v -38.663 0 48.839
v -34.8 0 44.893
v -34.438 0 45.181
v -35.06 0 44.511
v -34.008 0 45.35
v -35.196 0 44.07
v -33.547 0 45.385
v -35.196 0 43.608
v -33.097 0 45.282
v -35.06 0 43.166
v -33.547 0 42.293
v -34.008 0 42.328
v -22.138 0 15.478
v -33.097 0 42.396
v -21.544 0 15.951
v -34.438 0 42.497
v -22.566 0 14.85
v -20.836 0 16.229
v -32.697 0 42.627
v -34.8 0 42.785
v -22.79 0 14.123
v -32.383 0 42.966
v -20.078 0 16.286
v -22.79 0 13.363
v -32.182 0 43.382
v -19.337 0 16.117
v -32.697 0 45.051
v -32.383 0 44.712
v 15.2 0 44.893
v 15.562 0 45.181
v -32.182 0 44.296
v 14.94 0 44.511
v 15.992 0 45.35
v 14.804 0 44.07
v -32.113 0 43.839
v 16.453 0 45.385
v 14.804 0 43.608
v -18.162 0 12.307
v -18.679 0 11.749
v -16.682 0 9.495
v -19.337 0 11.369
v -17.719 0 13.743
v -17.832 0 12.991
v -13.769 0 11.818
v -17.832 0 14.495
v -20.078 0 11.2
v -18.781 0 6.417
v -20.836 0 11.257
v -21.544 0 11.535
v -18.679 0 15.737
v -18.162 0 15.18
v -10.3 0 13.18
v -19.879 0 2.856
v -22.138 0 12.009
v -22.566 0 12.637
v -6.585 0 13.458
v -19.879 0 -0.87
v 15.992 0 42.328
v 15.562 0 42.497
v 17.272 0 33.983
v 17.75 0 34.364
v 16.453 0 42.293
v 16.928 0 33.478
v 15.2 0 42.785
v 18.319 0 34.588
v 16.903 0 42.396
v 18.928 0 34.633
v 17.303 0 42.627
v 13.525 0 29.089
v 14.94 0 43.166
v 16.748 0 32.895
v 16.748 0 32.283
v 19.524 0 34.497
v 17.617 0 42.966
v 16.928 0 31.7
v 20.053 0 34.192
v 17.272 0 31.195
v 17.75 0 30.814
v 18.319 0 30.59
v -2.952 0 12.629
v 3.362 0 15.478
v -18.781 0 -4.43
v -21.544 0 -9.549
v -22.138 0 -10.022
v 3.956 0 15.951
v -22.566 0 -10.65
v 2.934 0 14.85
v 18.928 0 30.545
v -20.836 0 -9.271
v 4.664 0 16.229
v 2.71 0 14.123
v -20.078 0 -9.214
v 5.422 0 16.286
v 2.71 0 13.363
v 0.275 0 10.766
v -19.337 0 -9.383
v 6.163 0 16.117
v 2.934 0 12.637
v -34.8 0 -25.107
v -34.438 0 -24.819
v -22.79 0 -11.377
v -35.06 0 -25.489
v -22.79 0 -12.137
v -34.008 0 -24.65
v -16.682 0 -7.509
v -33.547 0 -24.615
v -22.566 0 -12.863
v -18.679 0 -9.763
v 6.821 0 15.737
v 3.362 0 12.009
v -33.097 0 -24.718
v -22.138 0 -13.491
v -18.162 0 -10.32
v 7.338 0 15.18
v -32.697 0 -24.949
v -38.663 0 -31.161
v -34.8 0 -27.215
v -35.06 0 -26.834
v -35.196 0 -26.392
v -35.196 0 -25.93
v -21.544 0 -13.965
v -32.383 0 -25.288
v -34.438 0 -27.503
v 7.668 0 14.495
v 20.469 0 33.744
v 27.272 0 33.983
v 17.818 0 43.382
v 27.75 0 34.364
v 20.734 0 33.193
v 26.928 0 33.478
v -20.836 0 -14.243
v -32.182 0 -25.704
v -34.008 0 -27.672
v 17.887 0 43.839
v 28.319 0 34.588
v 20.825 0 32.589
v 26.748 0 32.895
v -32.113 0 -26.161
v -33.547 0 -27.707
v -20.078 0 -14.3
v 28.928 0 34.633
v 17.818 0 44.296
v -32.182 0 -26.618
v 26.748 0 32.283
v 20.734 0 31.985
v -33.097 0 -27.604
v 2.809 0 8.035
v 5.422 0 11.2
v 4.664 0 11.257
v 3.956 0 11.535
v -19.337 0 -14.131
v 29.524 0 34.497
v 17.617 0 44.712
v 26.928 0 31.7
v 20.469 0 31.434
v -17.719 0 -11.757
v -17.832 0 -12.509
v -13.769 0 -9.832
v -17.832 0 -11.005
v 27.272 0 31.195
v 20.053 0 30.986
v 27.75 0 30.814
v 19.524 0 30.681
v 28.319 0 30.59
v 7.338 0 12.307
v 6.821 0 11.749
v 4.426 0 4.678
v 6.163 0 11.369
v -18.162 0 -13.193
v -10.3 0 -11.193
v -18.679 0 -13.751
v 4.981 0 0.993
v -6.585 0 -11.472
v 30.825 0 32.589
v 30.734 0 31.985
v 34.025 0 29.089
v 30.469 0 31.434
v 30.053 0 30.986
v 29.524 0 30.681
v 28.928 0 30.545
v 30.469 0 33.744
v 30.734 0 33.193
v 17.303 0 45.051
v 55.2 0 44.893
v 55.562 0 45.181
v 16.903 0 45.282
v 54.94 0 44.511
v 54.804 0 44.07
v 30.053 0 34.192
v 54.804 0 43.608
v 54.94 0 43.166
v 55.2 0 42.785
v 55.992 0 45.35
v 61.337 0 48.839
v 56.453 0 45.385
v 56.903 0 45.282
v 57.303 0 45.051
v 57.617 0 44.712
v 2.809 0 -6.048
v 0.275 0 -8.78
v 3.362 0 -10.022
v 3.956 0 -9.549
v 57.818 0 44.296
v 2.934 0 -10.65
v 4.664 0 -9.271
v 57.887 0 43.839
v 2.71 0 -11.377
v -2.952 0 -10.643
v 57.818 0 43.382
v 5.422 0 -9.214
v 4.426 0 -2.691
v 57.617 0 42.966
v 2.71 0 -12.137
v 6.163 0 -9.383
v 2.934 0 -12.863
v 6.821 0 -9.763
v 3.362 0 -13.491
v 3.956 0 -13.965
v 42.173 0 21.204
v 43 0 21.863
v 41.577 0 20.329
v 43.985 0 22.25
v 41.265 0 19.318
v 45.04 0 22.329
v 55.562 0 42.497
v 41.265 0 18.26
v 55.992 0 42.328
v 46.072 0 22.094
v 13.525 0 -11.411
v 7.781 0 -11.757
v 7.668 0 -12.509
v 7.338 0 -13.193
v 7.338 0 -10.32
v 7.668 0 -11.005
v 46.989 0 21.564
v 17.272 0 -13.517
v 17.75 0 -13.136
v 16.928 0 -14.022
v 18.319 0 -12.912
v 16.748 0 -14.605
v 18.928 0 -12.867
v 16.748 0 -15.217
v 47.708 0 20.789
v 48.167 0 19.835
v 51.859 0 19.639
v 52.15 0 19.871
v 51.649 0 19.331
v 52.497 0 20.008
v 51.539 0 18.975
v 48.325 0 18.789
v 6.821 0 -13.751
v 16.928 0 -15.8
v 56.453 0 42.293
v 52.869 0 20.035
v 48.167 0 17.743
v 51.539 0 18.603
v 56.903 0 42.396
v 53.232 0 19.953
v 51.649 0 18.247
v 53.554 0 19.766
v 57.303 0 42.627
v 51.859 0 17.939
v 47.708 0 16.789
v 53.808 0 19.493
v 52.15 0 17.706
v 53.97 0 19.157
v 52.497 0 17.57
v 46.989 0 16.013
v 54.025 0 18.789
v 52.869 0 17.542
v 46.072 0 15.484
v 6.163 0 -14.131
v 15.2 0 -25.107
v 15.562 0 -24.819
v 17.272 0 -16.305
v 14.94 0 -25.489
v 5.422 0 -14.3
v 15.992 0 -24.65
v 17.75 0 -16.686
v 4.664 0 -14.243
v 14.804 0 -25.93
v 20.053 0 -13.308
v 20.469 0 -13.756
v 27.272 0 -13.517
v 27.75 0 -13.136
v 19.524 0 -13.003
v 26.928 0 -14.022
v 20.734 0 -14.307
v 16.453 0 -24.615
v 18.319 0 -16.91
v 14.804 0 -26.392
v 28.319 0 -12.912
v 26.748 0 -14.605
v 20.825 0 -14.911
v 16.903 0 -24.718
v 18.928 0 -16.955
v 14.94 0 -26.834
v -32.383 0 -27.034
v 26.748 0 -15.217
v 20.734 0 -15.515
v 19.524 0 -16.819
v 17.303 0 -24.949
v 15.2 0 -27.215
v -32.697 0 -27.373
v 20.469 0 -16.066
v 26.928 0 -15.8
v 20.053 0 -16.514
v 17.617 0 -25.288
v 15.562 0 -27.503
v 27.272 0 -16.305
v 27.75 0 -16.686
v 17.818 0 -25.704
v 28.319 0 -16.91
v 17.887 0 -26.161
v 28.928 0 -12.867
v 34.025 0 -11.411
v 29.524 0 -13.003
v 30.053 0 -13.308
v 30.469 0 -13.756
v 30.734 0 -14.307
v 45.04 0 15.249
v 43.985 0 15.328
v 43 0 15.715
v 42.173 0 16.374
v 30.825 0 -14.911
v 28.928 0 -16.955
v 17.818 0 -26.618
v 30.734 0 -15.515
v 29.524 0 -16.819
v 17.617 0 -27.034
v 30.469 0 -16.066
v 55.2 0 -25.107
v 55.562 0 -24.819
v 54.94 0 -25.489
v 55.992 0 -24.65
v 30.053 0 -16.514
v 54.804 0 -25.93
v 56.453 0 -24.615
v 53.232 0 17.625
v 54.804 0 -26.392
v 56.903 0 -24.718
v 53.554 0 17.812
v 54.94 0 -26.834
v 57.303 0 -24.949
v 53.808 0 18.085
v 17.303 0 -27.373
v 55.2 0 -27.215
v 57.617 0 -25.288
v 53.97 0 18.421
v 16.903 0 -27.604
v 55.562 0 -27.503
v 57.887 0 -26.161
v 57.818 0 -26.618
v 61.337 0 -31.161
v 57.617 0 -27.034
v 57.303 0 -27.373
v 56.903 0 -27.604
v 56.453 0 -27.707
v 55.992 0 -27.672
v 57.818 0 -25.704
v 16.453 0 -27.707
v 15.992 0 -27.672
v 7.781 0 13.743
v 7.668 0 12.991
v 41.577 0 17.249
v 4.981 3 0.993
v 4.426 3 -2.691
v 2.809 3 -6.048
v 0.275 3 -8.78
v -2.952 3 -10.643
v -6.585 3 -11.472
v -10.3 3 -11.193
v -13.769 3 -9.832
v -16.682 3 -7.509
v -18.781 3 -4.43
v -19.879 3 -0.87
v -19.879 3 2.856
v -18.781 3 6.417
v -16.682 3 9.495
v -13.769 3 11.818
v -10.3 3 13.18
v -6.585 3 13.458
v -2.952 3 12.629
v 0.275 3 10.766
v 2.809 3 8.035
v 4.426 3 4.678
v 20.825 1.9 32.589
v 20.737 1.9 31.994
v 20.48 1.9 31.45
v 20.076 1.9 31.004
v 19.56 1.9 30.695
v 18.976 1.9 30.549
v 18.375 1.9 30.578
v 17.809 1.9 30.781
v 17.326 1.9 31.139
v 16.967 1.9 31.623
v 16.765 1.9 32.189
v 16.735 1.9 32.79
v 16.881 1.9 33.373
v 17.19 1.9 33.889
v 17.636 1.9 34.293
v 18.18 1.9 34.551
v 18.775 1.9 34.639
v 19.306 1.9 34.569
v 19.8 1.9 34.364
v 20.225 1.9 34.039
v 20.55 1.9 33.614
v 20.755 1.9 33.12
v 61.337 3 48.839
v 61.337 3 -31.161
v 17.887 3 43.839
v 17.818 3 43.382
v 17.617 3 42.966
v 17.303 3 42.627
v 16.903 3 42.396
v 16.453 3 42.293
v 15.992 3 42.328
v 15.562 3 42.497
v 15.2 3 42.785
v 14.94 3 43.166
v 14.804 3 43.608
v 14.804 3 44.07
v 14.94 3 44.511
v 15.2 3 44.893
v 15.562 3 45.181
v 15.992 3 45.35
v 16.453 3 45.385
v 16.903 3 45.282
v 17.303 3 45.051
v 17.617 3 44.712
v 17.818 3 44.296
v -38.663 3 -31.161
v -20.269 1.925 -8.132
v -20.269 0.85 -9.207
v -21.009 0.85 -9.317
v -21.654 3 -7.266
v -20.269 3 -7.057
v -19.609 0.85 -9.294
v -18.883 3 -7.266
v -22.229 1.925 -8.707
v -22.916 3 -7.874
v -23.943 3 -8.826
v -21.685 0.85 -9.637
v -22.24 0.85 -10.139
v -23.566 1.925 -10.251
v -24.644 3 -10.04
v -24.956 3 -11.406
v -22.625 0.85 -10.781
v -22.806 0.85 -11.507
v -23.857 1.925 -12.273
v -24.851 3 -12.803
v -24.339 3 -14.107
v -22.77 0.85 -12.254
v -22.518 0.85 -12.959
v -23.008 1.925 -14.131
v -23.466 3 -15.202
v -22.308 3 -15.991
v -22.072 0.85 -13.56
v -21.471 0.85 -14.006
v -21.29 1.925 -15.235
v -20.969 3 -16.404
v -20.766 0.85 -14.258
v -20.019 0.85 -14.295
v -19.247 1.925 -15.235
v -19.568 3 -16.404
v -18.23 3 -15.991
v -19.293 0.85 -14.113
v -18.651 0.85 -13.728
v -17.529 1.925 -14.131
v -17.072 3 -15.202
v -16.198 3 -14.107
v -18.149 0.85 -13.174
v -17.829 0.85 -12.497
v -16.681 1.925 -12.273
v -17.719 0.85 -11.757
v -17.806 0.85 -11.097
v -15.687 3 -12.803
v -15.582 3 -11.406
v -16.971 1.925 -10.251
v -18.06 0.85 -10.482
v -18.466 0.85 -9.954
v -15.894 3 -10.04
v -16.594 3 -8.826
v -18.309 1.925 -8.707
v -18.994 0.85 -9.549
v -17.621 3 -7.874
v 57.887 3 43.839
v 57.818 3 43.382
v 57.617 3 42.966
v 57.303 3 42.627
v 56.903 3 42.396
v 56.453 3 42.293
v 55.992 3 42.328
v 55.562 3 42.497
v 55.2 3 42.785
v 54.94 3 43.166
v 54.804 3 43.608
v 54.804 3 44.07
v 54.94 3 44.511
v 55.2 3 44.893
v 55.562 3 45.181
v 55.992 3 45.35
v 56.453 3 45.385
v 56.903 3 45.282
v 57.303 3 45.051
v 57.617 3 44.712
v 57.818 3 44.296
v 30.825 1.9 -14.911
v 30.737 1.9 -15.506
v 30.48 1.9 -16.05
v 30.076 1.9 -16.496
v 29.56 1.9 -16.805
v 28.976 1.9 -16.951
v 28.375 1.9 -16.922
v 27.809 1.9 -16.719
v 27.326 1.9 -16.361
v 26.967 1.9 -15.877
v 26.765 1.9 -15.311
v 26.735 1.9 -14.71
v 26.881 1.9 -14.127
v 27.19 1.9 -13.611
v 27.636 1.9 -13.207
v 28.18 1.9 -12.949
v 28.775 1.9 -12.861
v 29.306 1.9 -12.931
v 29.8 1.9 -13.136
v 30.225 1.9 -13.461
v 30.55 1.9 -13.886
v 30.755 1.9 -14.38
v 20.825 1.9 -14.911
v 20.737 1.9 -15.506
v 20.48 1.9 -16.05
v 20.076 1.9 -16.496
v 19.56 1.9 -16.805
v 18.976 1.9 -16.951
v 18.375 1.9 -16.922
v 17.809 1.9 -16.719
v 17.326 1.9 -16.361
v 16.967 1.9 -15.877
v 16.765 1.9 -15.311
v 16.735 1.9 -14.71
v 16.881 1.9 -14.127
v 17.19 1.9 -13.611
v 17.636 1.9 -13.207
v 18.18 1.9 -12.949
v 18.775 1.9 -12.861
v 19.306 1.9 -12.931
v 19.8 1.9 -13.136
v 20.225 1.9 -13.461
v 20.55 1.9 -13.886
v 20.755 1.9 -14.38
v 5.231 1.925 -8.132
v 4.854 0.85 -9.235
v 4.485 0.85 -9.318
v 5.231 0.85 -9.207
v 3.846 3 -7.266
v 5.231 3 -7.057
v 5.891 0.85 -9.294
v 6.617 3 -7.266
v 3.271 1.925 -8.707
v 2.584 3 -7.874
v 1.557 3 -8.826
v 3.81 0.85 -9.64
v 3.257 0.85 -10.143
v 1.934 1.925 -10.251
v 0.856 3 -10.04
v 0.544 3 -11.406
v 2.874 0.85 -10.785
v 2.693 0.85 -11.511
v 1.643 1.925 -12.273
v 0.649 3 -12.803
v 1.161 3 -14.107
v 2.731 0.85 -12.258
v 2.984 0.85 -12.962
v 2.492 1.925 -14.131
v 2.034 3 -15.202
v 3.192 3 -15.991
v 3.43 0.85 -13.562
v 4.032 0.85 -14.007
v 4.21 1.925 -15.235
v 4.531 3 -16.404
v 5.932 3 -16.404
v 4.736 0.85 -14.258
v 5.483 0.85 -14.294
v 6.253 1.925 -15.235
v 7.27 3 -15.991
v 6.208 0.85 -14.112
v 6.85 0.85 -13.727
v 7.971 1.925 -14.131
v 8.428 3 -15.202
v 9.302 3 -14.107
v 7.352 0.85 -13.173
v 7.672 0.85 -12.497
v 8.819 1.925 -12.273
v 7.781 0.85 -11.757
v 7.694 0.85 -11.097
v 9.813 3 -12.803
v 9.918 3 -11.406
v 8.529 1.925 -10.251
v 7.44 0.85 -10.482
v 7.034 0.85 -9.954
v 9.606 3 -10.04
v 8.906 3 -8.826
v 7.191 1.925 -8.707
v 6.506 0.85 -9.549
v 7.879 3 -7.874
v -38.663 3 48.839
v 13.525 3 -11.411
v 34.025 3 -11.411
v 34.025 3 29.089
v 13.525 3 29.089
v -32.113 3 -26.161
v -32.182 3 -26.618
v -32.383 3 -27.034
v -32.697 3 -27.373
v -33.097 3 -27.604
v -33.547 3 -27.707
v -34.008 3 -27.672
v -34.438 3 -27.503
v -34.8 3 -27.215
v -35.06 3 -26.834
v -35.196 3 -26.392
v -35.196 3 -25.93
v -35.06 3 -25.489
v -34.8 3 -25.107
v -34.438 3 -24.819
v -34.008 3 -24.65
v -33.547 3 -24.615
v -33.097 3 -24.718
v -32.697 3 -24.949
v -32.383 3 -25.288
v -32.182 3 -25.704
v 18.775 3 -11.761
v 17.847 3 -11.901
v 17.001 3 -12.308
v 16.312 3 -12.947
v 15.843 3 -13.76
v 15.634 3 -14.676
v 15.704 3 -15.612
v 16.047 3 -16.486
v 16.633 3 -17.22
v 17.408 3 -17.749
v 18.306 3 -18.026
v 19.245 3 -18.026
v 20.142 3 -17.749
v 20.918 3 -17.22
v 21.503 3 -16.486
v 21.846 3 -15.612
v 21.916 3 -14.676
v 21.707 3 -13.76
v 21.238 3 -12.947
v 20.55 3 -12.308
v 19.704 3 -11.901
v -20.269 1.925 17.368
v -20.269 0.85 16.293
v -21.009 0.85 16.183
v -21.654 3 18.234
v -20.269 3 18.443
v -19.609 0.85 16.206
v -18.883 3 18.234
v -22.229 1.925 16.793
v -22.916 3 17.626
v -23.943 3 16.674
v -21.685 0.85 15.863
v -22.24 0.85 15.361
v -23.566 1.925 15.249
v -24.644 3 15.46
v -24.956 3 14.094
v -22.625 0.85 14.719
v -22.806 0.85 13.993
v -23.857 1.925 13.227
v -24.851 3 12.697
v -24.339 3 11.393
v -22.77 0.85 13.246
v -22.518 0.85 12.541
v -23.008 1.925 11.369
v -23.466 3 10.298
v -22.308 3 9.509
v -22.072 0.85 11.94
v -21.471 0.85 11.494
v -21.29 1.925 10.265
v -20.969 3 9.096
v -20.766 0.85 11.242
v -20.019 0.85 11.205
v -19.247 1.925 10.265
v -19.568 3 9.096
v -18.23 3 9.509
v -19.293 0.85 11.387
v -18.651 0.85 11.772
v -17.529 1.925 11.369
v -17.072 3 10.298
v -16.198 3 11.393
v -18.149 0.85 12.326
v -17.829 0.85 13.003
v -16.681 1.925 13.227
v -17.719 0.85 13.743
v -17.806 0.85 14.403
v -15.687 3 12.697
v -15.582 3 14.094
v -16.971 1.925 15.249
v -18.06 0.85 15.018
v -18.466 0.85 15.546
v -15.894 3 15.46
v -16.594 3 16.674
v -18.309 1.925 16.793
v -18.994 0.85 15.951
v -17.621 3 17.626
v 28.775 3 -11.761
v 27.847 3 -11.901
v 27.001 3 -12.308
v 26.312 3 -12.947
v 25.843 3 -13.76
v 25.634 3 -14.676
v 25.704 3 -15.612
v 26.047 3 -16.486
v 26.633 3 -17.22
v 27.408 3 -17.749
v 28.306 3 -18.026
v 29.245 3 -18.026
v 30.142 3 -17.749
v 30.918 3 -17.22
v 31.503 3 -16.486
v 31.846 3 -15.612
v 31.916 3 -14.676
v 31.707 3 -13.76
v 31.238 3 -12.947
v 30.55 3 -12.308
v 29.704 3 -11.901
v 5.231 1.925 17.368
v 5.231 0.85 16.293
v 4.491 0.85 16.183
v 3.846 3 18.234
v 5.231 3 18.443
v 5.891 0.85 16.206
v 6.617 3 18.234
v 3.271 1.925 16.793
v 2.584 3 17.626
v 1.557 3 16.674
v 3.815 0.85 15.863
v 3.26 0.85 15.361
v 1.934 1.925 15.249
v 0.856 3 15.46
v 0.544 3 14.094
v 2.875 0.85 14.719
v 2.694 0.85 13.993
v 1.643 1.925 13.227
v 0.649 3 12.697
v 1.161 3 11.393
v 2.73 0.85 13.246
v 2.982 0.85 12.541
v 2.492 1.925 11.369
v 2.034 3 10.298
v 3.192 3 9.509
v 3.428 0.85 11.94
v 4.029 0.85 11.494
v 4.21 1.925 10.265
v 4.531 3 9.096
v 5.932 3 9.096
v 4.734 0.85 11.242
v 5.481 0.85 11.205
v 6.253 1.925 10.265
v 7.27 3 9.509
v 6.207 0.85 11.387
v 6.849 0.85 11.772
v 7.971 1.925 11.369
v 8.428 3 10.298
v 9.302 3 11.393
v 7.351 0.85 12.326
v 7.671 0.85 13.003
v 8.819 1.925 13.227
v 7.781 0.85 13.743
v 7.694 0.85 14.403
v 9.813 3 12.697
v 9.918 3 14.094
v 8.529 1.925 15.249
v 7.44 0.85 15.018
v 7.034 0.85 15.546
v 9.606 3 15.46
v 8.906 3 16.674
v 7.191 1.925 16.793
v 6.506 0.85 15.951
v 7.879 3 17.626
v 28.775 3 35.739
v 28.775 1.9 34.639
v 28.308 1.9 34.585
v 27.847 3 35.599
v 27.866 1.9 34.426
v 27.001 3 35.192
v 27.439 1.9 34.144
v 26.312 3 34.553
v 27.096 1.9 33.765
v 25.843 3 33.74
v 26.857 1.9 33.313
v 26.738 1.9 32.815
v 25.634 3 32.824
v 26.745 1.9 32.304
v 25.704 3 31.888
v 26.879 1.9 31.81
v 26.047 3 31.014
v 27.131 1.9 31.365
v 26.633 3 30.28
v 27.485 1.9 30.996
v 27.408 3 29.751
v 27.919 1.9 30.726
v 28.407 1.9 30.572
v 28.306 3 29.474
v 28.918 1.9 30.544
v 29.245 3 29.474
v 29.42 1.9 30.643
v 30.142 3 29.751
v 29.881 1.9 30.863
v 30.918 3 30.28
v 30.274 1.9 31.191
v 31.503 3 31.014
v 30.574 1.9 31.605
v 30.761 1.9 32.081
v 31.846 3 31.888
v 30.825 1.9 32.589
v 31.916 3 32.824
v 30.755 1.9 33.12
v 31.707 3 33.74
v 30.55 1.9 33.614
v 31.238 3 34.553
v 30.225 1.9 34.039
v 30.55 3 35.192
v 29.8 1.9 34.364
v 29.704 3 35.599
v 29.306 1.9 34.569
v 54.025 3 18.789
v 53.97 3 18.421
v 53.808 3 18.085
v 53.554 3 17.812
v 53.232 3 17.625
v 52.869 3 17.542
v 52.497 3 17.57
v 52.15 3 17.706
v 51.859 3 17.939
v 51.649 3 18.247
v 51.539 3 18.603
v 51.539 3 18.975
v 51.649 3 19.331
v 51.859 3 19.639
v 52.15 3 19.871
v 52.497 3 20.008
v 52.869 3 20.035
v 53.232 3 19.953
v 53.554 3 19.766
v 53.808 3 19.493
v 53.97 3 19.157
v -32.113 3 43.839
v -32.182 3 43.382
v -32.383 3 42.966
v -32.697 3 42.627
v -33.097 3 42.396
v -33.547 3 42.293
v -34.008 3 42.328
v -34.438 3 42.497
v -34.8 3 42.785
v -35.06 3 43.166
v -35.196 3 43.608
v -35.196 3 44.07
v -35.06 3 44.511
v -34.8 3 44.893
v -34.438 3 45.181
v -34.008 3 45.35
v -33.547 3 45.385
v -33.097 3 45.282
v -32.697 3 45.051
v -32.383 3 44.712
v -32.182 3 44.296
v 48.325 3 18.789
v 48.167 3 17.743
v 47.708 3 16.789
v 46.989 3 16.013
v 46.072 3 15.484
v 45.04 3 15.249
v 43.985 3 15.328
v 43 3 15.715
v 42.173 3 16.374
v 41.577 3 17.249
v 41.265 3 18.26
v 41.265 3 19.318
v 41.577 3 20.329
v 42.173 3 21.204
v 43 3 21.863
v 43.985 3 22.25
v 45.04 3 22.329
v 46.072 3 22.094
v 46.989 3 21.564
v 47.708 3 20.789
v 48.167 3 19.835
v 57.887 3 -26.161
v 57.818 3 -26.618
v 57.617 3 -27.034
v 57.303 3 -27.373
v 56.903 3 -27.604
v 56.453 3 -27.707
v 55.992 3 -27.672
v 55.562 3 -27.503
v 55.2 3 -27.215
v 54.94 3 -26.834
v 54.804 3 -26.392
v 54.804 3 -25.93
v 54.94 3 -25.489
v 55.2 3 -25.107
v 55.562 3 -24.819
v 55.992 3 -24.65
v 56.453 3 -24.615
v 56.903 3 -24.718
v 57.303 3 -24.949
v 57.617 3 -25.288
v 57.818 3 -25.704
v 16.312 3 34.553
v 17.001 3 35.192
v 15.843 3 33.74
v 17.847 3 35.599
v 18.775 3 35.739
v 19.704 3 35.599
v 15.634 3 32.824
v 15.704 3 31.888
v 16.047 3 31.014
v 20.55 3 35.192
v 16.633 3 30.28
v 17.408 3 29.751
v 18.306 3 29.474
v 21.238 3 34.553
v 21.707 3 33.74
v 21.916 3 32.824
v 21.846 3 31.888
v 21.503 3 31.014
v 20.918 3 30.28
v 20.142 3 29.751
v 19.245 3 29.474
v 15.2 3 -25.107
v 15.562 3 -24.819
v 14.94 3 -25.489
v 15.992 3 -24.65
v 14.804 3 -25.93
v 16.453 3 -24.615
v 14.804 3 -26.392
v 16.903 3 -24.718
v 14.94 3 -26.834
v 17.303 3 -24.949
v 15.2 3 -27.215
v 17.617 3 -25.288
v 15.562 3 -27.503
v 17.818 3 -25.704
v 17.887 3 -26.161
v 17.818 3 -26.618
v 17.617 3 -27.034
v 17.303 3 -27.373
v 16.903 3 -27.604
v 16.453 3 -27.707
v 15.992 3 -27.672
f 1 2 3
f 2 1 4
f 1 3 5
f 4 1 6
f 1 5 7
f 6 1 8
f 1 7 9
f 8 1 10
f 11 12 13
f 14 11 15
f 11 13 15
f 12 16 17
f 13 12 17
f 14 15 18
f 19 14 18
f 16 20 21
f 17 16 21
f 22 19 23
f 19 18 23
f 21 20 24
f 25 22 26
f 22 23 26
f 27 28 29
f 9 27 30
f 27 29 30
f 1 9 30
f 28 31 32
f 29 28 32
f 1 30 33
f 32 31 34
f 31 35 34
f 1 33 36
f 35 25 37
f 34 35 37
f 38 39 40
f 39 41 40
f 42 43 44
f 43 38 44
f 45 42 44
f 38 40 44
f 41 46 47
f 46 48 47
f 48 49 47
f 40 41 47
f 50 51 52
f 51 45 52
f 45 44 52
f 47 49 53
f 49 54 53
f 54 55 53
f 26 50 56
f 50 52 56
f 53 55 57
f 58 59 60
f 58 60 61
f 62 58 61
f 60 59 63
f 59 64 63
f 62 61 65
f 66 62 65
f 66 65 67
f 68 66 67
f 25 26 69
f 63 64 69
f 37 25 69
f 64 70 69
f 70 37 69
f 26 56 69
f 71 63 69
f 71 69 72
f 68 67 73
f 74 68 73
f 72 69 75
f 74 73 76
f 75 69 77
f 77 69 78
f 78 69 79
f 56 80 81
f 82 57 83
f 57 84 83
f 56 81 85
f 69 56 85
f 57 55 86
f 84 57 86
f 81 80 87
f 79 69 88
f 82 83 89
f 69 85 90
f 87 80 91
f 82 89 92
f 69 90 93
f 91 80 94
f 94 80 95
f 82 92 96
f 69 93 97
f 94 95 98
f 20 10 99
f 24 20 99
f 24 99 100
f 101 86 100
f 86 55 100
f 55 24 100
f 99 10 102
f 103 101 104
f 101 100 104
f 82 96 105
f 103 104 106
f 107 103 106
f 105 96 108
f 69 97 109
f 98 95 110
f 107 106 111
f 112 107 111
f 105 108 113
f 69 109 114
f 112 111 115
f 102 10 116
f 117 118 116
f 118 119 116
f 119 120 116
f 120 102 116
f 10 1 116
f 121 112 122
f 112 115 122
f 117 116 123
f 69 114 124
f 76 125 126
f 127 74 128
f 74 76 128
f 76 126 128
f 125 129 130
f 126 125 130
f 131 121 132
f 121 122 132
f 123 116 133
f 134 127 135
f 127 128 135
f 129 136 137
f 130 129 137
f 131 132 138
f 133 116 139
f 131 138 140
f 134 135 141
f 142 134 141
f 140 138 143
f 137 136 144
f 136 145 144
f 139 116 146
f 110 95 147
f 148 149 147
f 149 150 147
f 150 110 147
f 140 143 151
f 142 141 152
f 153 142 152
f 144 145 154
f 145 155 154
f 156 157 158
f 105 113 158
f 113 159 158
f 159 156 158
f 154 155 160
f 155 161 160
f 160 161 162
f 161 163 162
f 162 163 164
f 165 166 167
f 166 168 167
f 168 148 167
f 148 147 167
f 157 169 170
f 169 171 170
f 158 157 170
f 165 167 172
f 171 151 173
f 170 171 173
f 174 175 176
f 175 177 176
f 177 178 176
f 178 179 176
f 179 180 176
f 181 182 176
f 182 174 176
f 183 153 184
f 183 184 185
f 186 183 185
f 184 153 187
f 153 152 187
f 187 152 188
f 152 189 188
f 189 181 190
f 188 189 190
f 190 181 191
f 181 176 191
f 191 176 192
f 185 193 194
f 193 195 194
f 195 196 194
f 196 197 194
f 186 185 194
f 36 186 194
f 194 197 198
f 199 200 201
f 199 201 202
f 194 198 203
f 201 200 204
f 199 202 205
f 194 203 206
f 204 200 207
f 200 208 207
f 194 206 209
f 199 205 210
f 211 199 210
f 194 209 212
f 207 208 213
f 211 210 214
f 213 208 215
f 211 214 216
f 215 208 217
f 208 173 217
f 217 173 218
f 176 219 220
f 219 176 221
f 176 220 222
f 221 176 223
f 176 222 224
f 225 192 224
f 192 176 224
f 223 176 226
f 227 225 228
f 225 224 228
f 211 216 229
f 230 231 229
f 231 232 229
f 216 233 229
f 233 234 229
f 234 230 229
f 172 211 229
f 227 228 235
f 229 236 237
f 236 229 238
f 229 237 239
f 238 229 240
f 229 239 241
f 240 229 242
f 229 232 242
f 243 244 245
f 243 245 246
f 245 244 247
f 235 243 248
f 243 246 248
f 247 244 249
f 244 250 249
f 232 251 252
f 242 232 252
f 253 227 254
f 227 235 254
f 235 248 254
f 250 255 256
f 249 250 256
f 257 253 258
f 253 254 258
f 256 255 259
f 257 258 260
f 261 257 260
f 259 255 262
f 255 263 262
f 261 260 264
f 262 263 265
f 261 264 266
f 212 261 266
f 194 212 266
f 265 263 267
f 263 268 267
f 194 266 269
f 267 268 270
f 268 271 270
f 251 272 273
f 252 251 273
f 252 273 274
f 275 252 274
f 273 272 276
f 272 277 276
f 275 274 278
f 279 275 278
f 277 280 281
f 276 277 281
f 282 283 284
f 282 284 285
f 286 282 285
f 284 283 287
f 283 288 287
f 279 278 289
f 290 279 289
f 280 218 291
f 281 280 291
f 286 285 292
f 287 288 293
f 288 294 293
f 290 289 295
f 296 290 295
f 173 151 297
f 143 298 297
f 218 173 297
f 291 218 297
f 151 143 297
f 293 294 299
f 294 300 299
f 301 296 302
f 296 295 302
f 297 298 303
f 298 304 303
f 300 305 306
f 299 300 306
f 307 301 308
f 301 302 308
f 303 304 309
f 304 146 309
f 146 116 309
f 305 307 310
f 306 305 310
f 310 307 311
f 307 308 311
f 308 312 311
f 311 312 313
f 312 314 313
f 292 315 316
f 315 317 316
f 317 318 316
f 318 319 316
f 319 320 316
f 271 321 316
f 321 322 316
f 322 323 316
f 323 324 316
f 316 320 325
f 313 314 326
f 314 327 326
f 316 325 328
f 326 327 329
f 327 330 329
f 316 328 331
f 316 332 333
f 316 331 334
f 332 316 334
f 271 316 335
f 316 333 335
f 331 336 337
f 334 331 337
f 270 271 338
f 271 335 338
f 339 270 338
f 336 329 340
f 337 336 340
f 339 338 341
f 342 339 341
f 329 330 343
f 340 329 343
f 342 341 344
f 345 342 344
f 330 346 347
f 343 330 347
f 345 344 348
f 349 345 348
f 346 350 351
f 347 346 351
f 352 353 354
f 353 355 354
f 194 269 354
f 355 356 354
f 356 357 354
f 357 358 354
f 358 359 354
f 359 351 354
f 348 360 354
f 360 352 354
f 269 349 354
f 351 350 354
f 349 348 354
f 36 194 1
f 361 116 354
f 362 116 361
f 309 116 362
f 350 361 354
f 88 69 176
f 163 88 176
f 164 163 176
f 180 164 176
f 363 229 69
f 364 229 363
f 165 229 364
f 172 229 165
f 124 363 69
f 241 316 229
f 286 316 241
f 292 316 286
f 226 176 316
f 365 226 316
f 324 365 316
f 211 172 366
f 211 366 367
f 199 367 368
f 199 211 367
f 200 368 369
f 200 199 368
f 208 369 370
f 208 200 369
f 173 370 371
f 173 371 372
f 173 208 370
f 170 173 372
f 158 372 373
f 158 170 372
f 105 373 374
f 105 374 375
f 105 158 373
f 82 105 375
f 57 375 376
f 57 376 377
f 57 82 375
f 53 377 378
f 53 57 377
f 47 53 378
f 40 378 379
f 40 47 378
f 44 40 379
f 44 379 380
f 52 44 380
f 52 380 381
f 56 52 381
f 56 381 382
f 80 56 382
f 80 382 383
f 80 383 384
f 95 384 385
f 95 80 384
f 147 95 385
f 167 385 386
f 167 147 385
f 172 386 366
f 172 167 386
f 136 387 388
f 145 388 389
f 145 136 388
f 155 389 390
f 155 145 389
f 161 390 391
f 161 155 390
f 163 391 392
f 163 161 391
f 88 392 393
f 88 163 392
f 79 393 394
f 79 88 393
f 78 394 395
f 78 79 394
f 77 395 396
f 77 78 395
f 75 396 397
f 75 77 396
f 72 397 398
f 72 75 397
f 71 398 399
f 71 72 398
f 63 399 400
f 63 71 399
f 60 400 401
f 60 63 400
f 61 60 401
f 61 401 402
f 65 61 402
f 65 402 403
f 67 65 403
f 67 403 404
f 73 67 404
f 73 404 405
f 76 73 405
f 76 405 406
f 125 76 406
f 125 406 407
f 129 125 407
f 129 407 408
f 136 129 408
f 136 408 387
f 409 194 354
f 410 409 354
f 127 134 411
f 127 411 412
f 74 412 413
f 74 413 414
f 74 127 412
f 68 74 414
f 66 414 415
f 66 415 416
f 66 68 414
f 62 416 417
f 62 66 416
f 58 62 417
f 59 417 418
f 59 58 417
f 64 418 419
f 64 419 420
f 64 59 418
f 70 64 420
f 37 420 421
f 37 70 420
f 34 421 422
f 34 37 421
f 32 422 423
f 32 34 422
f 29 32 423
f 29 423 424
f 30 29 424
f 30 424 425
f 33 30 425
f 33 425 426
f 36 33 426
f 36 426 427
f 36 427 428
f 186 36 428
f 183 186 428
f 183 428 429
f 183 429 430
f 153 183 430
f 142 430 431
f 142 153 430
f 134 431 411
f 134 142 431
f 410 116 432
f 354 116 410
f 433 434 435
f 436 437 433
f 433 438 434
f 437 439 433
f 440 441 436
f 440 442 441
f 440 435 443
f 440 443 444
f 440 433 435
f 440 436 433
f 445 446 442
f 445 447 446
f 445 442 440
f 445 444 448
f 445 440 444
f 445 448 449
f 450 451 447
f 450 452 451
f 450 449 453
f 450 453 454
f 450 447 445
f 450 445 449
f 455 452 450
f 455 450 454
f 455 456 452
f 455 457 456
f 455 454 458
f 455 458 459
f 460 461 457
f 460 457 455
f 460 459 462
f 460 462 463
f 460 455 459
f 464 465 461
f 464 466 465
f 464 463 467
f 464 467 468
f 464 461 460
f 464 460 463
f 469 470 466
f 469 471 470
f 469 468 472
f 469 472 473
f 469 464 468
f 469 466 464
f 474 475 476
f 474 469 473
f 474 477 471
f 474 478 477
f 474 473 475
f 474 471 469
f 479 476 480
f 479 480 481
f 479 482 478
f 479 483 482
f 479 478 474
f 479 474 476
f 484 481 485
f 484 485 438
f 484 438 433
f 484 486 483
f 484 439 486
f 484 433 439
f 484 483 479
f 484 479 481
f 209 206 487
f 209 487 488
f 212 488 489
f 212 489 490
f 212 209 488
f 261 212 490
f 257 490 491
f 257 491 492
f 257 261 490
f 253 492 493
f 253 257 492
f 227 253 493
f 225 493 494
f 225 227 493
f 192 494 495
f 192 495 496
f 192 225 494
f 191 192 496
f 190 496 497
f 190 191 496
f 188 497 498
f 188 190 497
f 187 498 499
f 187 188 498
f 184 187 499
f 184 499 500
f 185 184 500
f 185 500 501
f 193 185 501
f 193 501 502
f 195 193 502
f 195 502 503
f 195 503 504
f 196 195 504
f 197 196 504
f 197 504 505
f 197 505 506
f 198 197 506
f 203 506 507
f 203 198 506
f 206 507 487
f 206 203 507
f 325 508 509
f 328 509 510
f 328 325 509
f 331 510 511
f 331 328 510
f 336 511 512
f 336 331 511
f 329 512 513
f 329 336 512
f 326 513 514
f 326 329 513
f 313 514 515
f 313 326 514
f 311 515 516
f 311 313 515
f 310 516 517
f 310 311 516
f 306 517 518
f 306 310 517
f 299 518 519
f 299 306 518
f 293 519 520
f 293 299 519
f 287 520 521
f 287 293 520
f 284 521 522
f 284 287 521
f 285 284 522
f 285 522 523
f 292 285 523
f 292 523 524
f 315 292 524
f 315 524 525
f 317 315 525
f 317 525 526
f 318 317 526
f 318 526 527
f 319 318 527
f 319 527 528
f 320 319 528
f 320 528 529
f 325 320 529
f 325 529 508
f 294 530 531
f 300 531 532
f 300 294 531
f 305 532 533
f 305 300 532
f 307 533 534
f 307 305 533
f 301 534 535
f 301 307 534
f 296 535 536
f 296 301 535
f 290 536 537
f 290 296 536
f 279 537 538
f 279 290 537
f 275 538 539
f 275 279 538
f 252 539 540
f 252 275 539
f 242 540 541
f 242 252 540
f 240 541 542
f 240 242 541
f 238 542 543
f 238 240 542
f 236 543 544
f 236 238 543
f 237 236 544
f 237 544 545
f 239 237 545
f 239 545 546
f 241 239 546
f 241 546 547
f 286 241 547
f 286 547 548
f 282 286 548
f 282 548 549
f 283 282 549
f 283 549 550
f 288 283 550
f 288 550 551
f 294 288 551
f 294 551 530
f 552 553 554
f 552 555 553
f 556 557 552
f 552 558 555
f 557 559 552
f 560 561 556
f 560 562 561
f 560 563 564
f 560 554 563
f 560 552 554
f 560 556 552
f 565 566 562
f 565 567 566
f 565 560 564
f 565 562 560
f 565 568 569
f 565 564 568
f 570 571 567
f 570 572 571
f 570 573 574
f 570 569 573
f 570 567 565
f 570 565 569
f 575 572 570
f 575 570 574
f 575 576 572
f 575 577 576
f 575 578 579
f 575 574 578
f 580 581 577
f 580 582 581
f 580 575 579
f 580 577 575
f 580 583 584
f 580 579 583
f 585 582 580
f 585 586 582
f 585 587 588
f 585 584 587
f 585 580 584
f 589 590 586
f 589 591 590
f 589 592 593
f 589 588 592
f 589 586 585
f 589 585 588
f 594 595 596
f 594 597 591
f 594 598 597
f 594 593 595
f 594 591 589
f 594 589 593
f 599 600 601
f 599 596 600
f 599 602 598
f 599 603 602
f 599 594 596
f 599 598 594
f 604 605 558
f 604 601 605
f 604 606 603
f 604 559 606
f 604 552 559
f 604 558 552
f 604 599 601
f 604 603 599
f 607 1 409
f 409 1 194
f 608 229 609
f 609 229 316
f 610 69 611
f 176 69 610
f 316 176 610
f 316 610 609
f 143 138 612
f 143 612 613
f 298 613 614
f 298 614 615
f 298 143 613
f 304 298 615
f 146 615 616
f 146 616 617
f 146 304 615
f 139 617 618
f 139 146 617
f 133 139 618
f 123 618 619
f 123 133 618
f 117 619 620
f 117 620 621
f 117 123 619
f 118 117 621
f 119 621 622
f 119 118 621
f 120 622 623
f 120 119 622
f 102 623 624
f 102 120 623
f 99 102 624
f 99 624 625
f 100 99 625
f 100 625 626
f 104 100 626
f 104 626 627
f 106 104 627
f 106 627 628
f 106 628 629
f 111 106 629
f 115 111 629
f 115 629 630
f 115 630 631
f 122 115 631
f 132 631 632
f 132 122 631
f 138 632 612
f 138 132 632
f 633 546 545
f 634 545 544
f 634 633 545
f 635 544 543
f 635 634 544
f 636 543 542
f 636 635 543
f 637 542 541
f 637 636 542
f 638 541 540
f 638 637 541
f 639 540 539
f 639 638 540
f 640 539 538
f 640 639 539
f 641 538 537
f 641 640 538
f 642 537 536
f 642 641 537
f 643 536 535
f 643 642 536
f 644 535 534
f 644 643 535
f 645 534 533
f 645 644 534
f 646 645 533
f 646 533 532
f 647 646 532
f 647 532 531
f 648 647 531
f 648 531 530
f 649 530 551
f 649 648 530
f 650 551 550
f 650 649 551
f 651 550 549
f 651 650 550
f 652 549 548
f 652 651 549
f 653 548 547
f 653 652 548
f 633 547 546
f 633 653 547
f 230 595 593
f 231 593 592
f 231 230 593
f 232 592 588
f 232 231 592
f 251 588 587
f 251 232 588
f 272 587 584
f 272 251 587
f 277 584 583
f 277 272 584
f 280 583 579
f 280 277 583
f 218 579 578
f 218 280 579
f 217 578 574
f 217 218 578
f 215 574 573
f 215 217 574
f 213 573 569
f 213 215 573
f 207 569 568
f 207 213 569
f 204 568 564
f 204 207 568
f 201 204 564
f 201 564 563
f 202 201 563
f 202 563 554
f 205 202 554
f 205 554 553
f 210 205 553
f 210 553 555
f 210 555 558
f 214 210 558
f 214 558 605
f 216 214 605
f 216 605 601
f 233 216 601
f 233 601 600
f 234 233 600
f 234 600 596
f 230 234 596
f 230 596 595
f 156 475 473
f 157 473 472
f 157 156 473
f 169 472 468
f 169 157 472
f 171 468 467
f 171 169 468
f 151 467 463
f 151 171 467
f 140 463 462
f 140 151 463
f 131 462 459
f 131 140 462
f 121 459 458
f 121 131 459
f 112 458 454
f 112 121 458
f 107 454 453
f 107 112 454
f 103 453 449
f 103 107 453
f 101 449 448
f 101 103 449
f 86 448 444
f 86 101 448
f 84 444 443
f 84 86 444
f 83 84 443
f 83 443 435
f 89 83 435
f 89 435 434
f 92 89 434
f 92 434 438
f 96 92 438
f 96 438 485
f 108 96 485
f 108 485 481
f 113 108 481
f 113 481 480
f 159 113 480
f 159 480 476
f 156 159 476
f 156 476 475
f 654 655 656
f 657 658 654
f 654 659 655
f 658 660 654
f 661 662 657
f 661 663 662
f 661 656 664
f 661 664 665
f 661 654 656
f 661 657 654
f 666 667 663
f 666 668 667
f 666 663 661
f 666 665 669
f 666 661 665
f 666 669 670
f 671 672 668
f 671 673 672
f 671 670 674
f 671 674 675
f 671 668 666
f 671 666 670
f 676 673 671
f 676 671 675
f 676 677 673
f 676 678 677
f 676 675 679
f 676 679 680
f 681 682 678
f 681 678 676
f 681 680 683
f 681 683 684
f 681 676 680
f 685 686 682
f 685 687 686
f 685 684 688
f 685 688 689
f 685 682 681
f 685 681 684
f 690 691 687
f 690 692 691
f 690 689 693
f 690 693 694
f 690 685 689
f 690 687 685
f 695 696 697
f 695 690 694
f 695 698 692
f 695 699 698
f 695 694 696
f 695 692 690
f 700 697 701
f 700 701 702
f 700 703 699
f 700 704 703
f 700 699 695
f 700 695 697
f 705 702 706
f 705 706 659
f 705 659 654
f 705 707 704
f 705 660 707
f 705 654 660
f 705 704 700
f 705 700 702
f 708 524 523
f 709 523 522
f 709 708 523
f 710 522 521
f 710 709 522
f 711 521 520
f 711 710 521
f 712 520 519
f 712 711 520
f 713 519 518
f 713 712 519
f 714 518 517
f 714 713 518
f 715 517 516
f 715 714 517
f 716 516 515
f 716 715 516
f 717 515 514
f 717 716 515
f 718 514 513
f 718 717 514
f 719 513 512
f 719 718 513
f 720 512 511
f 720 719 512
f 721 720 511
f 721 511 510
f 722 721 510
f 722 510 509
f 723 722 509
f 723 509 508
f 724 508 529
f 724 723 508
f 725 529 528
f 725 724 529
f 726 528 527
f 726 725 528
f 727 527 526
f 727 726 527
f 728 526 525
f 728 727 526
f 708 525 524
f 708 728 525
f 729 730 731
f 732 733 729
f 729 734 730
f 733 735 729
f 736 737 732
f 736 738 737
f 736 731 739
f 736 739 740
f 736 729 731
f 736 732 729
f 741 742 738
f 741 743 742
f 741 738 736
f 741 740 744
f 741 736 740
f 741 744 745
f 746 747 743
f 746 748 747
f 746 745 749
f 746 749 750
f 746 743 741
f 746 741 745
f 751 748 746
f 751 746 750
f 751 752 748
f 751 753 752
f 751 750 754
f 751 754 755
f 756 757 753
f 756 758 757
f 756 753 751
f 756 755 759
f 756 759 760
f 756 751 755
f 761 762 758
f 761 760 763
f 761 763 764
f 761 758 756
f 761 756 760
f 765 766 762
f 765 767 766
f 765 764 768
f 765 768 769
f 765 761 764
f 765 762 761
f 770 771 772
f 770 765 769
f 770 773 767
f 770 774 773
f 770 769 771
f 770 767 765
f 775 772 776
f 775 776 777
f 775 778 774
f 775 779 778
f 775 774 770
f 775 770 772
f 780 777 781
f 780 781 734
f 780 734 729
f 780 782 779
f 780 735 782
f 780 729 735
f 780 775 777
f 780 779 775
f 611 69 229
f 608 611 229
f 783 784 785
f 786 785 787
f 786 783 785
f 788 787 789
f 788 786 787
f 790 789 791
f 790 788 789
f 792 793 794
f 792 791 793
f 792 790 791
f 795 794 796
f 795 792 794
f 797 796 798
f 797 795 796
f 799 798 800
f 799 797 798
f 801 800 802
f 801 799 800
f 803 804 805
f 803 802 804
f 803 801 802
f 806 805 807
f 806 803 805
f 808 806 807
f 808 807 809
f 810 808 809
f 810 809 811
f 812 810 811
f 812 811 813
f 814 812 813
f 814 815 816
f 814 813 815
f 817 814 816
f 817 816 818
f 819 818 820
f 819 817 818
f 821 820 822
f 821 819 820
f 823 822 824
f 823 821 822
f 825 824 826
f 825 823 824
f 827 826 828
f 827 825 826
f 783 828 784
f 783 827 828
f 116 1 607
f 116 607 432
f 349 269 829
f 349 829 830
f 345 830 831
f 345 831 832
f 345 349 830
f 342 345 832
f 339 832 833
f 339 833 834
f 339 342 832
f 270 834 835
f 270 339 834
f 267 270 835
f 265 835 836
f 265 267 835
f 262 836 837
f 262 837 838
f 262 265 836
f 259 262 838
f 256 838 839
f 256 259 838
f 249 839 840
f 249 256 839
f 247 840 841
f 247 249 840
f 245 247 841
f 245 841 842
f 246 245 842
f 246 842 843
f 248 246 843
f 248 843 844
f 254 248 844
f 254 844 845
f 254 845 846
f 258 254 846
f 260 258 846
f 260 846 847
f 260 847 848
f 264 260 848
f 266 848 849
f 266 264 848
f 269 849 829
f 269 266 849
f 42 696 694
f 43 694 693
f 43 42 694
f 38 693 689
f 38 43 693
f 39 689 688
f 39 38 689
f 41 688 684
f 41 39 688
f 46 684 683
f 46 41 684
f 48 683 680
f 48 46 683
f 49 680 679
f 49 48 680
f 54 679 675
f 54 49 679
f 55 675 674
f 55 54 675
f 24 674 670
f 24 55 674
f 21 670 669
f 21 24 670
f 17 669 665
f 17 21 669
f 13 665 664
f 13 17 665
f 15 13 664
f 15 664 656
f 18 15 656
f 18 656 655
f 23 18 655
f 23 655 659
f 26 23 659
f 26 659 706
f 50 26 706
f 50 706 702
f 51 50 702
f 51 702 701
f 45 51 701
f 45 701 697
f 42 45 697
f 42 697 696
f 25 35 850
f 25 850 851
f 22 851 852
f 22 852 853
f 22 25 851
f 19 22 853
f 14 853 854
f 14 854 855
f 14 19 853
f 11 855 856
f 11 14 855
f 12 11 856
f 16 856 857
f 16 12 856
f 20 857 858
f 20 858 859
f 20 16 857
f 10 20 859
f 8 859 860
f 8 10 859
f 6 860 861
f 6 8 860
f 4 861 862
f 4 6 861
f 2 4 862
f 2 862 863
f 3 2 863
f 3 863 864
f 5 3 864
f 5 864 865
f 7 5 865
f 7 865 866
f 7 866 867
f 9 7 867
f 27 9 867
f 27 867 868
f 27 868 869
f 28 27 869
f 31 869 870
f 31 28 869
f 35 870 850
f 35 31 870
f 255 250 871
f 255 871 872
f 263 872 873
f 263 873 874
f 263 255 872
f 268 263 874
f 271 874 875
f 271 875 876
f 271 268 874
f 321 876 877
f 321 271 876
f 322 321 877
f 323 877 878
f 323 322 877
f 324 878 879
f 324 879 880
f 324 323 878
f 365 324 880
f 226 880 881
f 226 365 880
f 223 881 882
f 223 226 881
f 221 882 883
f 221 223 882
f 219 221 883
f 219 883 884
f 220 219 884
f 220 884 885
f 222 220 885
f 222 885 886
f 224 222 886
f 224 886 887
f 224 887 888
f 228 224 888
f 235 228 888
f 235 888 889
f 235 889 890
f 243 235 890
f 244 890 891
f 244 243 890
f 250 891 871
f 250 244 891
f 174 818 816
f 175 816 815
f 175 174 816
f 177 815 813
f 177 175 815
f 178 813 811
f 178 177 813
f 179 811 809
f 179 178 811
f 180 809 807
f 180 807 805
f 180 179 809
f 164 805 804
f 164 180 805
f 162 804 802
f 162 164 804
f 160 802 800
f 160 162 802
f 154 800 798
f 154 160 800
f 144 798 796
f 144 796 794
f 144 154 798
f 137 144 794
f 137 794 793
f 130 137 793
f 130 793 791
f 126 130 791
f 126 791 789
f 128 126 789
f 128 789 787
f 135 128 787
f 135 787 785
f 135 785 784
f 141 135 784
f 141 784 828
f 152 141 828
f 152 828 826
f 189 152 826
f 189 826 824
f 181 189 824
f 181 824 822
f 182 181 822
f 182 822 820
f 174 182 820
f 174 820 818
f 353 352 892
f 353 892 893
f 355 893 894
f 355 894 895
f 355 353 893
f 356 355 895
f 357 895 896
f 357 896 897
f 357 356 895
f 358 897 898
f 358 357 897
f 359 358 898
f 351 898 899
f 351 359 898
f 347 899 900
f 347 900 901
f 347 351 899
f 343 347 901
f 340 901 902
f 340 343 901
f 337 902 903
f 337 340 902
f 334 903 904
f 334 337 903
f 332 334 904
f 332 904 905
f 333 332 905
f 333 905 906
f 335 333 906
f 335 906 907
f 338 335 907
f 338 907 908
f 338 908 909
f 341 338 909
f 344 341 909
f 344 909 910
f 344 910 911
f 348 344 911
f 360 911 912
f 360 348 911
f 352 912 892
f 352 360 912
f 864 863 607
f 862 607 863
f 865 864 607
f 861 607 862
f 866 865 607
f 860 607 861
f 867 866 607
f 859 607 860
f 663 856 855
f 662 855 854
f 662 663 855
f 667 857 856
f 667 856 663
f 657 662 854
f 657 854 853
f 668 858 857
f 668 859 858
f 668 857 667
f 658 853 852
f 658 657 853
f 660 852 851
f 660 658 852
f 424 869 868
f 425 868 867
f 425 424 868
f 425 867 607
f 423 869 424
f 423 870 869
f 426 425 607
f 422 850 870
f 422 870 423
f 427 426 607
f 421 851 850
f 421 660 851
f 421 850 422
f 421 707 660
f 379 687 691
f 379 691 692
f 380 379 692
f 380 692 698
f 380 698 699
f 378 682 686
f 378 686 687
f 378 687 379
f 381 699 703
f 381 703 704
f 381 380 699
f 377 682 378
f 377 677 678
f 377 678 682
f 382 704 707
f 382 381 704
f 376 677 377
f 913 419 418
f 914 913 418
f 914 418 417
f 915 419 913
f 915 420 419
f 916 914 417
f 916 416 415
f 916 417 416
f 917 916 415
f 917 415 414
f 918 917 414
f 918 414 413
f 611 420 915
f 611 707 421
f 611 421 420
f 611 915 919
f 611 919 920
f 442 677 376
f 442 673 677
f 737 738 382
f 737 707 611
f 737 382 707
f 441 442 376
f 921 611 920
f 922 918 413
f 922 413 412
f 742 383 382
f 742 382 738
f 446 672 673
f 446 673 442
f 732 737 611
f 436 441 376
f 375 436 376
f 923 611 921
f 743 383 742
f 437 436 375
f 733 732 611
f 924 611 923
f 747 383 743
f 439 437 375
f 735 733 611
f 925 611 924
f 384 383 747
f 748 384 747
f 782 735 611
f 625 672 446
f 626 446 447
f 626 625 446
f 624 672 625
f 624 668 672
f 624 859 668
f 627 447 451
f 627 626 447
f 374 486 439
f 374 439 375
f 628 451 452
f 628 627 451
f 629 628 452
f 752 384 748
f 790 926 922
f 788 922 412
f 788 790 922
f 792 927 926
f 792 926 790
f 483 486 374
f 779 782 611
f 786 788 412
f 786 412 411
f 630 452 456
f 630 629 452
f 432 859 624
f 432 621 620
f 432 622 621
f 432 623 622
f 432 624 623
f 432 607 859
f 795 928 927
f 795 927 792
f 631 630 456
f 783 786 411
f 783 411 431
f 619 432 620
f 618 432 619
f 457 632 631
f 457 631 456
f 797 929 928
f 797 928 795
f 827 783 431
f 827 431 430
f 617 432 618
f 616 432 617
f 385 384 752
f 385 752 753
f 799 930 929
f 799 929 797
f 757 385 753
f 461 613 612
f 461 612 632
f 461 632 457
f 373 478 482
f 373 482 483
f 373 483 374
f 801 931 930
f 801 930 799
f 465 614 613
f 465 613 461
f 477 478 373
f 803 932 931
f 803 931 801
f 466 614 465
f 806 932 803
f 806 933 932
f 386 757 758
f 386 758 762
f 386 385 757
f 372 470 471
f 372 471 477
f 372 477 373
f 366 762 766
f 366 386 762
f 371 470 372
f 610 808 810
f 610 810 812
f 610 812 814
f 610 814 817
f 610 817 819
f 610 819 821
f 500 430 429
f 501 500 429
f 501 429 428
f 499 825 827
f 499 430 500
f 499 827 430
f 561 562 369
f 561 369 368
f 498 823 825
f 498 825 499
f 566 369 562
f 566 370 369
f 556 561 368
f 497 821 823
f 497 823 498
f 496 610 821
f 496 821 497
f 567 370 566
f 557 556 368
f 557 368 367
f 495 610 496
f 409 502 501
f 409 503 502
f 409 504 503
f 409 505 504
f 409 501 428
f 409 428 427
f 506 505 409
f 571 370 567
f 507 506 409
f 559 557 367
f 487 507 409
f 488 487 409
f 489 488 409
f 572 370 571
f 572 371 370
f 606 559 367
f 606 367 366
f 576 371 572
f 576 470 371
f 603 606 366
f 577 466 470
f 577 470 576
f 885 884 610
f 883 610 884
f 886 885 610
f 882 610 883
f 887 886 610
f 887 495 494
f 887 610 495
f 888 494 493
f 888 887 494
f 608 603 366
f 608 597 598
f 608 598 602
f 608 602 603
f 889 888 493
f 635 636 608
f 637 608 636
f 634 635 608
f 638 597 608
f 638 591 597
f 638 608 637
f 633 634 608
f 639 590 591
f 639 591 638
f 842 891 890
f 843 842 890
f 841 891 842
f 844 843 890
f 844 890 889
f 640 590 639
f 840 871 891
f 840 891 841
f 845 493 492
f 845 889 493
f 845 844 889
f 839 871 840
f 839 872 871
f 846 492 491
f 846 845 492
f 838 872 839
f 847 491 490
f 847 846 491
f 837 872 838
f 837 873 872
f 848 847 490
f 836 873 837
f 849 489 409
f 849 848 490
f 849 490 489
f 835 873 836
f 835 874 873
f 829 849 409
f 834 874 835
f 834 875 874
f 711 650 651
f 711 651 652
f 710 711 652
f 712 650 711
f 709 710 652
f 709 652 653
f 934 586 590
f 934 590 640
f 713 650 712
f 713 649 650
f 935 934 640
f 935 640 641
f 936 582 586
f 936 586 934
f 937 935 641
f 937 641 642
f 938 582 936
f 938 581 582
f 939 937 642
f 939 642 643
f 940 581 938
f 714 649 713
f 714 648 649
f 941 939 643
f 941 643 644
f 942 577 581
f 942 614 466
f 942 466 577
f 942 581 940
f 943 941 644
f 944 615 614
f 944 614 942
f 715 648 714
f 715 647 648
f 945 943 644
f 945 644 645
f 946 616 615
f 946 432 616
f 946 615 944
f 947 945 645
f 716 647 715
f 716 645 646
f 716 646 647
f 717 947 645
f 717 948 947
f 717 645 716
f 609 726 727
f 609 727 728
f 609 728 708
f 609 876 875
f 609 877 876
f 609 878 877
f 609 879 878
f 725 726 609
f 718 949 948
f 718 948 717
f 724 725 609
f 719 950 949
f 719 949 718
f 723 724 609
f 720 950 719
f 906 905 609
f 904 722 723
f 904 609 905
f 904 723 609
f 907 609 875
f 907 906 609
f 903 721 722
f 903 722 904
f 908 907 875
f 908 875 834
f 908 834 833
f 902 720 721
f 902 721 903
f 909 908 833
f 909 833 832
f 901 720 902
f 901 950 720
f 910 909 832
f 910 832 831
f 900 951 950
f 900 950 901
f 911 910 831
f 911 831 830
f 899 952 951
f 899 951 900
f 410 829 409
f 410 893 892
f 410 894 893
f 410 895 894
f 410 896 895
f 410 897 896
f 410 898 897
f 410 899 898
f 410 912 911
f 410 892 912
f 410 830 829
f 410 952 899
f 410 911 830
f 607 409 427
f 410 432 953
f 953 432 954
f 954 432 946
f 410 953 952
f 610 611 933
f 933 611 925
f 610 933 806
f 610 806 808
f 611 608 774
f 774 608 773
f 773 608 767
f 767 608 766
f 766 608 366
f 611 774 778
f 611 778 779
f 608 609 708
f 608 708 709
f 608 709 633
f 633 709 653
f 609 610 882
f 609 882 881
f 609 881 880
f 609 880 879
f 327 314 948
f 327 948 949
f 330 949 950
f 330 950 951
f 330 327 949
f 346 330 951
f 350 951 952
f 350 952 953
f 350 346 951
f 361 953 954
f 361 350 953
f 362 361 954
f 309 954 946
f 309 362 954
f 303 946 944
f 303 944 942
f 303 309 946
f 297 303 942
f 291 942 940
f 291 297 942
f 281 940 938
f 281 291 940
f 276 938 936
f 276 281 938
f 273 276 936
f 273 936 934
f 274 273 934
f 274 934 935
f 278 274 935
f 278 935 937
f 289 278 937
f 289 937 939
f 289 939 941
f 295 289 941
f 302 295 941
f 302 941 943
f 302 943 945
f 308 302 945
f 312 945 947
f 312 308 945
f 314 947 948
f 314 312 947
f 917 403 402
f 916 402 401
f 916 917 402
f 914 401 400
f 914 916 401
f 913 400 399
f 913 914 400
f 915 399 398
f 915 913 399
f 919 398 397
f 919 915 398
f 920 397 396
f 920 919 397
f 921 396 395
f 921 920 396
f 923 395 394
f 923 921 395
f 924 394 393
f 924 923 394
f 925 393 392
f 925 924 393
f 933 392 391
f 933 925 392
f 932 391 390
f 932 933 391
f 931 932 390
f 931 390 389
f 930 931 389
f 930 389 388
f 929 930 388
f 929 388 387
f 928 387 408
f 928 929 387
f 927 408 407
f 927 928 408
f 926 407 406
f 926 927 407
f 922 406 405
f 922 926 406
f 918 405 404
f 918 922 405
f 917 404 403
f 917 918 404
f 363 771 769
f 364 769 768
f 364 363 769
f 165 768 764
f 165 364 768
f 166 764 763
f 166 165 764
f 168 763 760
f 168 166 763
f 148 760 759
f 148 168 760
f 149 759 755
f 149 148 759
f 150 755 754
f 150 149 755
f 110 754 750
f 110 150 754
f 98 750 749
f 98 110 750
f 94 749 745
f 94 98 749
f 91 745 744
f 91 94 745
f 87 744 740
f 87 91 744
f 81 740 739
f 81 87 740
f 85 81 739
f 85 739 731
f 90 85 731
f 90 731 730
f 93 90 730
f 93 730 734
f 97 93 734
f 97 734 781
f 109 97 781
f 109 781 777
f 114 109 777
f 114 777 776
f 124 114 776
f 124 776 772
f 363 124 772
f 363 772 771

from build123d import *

# Parameters (mm, degrees)
SZKIC1_W                                     = 100
SZKIC1_H                                     = 80
SZKIC1_R                                     = 12.5
SZKIC1_R_2                                   = 2.55
SZKIC1_R_3                                   = 2.05
SZKIC1_R_4                                   = 3.55
SZKIC1_R_5                                   = 1.55
SZKIC1_R_6                                   = 1.25
SZKIC1_W_2                                   = 20.5
SZKIC1_H_2                                   = 40.5
DODANIE_WYCI_GNI_CIE1_DEPTH                  = 3
CSK_FOR_M4_COUNTERSUNK_FLAT_HEAD_SCR_2_COUNT = 2
CSK_FOR_M4_COUNTERSUNK_FLAT_HEAD_SCR_2_PITCH = 25.5
CSK_FOR_M4_COUNTERSUNK_FLAT_HEAD_SCR_3_COUNT = 2
CSK_FOR_M4_COUNTERSUNK_FLAT_HEAD_SCR_3_PITCH = 36.062445841
CSK_FOR_M4_COUNTERSUNK_FLAT_HEAD_SCR_4_COUNT = 2
CSK_FOR_M4_COUNTERSUNK_FLAT_HEAD_SCR_4_PITCH = 25.5
CSK_FOR_M3_COUNTERSUNK_FLAT_HEAD_SCR_2_COUNT = 2
CSK_FOR_M3_COUNTERSUNK_FLAT_HEAD_SCR_2_PITCH = 10
CSK_FOR_M3_COUNTERSUNK_FLAT_HEAD_SCR_3_COUNT = 2
CSK_FOR_M3_COUNTERSUNK_FLAT_HEAD_SCR_3_PITCH = 47.5
CSK_FOR_M3_COUNTERSUNK_FLAT_HEAD_SCR_4_COUNT = 2
CSK_FOR_M3_COUNTERSUNK_FLAT_HEAD_SCR_4_PITCH = 48.541219597


with BuildPart() as part:
    # Szkic1 → Dodanie-wyciągnięcie1 (new body)
    with BuildSketch(Plane(origin=(0, 0, 0), x_dir=(1, 0, 0), z_dir=(0, 1, 0))):
        with Locations((11.336719097, -8.838965942)):
            Rectangle(SZKIC1_W, SZKIC1_H)
        with Locations((-7.518770099, -0.993104788)):
            Circle(SZKIC1_R, mode=Mode.SUBTRACT)
        with Locations((-20.268770099, 11.756895212)):
            Circle(SZKIC1_R_2, mode=Mode.SUBTRACT)
        with Locations((5.231229901, 11.756895212)):
            Circle(SZKIC1_R_2, mode=Mode.SUBTRACT)
        with Locations((5.231229901, -13.743104788)):
            Circle(SZKIC1_R_2, mode=Mode.SUBTRACT)
        with Locations((-20.268770099, -13.743104788)):
            Circle(SZKIC1_R_2, mode=Mode.SUBTRACT)
        with Locations((18.775116298, 14.911034058)):
            Circle(SZKIC1_R_3, mode=Mode.SUBTRACT)
        with Locations((28.775116298, 14.911034058)):
            Circle(SZKIC1_R_3, mode=Mode.SUBTRACT)
        with Locations((18.775116298, -32.588965942)):
            Circle(SZKIC1_R_3, mode=Mode.SUBTRACT)
        with Locations((28.775116298, -32.588965942)):
            Circle(SZKIC1_R_3, mode=Mode.SUBTRACT)
        with Locations((44.775116298, -18.788965942)):
            Circle(SZKIC1_R_4, mode=Mode.SUBTRACT)
        with Locations((-33.663280903, 26.161034058)):
            Circle(SZKIC1_R_5, mode=Mode.SUBTRACT)
        with Locations((56.336719097, 26.161034058)):
            Circle(SZKIC1_R_5, mode=Mode.SUBTRACT)
        with Locations((56.336719097, -43.838965942)):
            Circle(SZKIC1_R_5, mode=Mode.SUBTRACT)
        with Locations((-33.663280903, -43.838965942)):
            Circle(SZKIC1_R_5, mode=Mode.SUBTRACT)
        with Locations((16.336719097, 26.161034058)):
            Circle(SZKIC1_R_5, mode=Mode.SUBTRACT)
        with Locations((16.336719097, -43.838965942)):
            Circle(SZKIC1_R_5, mode=Mode.SUBTRACT)
        with Locations((52.775116298, -18.788965942)):
            Circle(SZKIC1_R_6, mode=Mode.SUBTRACT)
        with Locations((23.775116298, -8.838965942)):
            Rectangle(SZKIC1_W_2, SZKIC1_H_2, mode=Mode.SUBTRACT)
    extrude(amount=DODANIE_WYCI_GNI_CIE1_DEPTH)

    # Sketch4 → CSK for M4 Countersunk Flat Head Screw1 (revolve, cut)
    with BuildSketch(Plane(origin=(-20.268770099, 3, 13.743104788), x_dir=(0, 0, 1), z_dir=(1, 0, 0))):
        Polygon((0, 0), (0, 3), (2.25, 3), (2.25, 2.45), (4.7, 0), align=None)
    csk_for_m4_countersunk_flat_head_screw1 = revolve(axis=Axis((-20.268770099, 9.35, 13.743104788), (0, -1, 0)), mode=Mode.SUBTRACT)

    # CSK for M4 Countersunk Flat Head Scr 2: CSK for M4 Countersunk Flat Head Screw1 ×2
    with Locations(*[(i * CSK_FOR_M4_COUNTERSUNK_FLAT_HEAD_SCR_2_PITCH, 0, 0) for i in range(1, CSK_FOR_M4_COUNTERSUNK_FLAT_HEAD_SCR_2_COUNT)]):
        add(csk_for_m4_countersunk_flat_head_screw1, mode=Mode.SUBTRACT)

    # CSK for M4 Countersunk Flat Head Scr 3: CSK for M4 Countersunk Flat Head Screw1 ×2
    with Locations(*[Vector(0.707106781, 0, -0.707106781) * (i * CSK_FOR_M4_COUNTERSUNK_FLAT_HEAD_SCR_3_PITCH) for i in range(1, CSK_FOR_M4_COUNTERSUNK_FLAT_HEAD_SCR_3_COUNT)]):
        add(csk_for_m4_countersunk_flat_head_screw1, mode=Mode.SUBTRACT)

    # CSK for M4 Countersunk Flat Head Scr 4: CSK for M4 Countersunk Flat Head Screw1 ×2
    with Locations(*[(0, 0, -i * CSK_FOR_M4_COUNTERSUNK_FLAT_HEAD_SCR_4_PITCH) for i in range(1, CSK_FOR_M4_COUNTERSUNK_FLAT_HEAD_SCR_4_COUNT)]):
        add(csk_for_m4_countersunk_flat_head_screw1, mode=Mode.SUBTRACT)

    # Sketch6 → CSK for M3 Countersunk Flat Head Screw1 (revolve, cut)
    with BuildSketch(Plane(origin=(18.775116298, 3, -14.911034058), x_dir=(0, 0, 1), z_dir=(1, 0, 0))):
        Polygon((0, 0), (0, 3), (1.7, 3), (1.7, 1.45), (3.15, 0), align=None)
    csk_for_m3_countersunk_flat_head_screw1 = revolve(axis=Axis((18.775116298, 9.35, -14.911034058), (0, -1, 0)), mode=Mode.SUBTRACT)

    # CSK for M3 Countersunk Flat Head Scr 2: CSK for M3 Countersunk Flat Head Screw1 ×2
    with Locations(*[(i * CSK_FOR_M3_COUNTERSUNK_FLAT_HEAD_SCR_2_PITCH, 0, 0) for i in range(1, CSK_FOR_M3_COUNTERSUNK_FLAT_HEAD_SCR_2_COUNT)]):
        add(csk_for_m3_countersunk_flat_head_screw1, mode=Mode.SUBTRACT)

    # CSK for M3 Countersunk Flat Head Scr 3: CSK for M3 Countersunk Flat Head Screw1 ×2
    with Locations(*[(0, 0, i * CSK_FOR_M3_COUNTERSUNK_FLAT_HEAD_SCR_3_PITCH) for i in range(1, CSK_FOR_M3_COUNTERSUNK_FLAT_HEAD_SCR_3_COUNT)]):
        add(csk_for_m3_countersunk_flat_head_screw1, mode=Mode.SUBTRACT)

    # CSK for M3 Countersunk Flat Head Scr 4: CSK for M3 Countersunk Flat Head Screw1 ×2
    with Locations(*[Vector(0.206010481, 0, 0.978549785) * (i * CSK_FOR_M3_COUNTERSUNK_FLAT_HEAD_SCR_4_PITCH) for i in range(1, CSK_FOR_M3_COUNTERSUNK_FLAT_HEAD_SCR_4_COUNT)]):
        add(csk_for_m3_countersunk_flat_head_screw1, mode=Mode.SUBTRACT)


solid = part.part
